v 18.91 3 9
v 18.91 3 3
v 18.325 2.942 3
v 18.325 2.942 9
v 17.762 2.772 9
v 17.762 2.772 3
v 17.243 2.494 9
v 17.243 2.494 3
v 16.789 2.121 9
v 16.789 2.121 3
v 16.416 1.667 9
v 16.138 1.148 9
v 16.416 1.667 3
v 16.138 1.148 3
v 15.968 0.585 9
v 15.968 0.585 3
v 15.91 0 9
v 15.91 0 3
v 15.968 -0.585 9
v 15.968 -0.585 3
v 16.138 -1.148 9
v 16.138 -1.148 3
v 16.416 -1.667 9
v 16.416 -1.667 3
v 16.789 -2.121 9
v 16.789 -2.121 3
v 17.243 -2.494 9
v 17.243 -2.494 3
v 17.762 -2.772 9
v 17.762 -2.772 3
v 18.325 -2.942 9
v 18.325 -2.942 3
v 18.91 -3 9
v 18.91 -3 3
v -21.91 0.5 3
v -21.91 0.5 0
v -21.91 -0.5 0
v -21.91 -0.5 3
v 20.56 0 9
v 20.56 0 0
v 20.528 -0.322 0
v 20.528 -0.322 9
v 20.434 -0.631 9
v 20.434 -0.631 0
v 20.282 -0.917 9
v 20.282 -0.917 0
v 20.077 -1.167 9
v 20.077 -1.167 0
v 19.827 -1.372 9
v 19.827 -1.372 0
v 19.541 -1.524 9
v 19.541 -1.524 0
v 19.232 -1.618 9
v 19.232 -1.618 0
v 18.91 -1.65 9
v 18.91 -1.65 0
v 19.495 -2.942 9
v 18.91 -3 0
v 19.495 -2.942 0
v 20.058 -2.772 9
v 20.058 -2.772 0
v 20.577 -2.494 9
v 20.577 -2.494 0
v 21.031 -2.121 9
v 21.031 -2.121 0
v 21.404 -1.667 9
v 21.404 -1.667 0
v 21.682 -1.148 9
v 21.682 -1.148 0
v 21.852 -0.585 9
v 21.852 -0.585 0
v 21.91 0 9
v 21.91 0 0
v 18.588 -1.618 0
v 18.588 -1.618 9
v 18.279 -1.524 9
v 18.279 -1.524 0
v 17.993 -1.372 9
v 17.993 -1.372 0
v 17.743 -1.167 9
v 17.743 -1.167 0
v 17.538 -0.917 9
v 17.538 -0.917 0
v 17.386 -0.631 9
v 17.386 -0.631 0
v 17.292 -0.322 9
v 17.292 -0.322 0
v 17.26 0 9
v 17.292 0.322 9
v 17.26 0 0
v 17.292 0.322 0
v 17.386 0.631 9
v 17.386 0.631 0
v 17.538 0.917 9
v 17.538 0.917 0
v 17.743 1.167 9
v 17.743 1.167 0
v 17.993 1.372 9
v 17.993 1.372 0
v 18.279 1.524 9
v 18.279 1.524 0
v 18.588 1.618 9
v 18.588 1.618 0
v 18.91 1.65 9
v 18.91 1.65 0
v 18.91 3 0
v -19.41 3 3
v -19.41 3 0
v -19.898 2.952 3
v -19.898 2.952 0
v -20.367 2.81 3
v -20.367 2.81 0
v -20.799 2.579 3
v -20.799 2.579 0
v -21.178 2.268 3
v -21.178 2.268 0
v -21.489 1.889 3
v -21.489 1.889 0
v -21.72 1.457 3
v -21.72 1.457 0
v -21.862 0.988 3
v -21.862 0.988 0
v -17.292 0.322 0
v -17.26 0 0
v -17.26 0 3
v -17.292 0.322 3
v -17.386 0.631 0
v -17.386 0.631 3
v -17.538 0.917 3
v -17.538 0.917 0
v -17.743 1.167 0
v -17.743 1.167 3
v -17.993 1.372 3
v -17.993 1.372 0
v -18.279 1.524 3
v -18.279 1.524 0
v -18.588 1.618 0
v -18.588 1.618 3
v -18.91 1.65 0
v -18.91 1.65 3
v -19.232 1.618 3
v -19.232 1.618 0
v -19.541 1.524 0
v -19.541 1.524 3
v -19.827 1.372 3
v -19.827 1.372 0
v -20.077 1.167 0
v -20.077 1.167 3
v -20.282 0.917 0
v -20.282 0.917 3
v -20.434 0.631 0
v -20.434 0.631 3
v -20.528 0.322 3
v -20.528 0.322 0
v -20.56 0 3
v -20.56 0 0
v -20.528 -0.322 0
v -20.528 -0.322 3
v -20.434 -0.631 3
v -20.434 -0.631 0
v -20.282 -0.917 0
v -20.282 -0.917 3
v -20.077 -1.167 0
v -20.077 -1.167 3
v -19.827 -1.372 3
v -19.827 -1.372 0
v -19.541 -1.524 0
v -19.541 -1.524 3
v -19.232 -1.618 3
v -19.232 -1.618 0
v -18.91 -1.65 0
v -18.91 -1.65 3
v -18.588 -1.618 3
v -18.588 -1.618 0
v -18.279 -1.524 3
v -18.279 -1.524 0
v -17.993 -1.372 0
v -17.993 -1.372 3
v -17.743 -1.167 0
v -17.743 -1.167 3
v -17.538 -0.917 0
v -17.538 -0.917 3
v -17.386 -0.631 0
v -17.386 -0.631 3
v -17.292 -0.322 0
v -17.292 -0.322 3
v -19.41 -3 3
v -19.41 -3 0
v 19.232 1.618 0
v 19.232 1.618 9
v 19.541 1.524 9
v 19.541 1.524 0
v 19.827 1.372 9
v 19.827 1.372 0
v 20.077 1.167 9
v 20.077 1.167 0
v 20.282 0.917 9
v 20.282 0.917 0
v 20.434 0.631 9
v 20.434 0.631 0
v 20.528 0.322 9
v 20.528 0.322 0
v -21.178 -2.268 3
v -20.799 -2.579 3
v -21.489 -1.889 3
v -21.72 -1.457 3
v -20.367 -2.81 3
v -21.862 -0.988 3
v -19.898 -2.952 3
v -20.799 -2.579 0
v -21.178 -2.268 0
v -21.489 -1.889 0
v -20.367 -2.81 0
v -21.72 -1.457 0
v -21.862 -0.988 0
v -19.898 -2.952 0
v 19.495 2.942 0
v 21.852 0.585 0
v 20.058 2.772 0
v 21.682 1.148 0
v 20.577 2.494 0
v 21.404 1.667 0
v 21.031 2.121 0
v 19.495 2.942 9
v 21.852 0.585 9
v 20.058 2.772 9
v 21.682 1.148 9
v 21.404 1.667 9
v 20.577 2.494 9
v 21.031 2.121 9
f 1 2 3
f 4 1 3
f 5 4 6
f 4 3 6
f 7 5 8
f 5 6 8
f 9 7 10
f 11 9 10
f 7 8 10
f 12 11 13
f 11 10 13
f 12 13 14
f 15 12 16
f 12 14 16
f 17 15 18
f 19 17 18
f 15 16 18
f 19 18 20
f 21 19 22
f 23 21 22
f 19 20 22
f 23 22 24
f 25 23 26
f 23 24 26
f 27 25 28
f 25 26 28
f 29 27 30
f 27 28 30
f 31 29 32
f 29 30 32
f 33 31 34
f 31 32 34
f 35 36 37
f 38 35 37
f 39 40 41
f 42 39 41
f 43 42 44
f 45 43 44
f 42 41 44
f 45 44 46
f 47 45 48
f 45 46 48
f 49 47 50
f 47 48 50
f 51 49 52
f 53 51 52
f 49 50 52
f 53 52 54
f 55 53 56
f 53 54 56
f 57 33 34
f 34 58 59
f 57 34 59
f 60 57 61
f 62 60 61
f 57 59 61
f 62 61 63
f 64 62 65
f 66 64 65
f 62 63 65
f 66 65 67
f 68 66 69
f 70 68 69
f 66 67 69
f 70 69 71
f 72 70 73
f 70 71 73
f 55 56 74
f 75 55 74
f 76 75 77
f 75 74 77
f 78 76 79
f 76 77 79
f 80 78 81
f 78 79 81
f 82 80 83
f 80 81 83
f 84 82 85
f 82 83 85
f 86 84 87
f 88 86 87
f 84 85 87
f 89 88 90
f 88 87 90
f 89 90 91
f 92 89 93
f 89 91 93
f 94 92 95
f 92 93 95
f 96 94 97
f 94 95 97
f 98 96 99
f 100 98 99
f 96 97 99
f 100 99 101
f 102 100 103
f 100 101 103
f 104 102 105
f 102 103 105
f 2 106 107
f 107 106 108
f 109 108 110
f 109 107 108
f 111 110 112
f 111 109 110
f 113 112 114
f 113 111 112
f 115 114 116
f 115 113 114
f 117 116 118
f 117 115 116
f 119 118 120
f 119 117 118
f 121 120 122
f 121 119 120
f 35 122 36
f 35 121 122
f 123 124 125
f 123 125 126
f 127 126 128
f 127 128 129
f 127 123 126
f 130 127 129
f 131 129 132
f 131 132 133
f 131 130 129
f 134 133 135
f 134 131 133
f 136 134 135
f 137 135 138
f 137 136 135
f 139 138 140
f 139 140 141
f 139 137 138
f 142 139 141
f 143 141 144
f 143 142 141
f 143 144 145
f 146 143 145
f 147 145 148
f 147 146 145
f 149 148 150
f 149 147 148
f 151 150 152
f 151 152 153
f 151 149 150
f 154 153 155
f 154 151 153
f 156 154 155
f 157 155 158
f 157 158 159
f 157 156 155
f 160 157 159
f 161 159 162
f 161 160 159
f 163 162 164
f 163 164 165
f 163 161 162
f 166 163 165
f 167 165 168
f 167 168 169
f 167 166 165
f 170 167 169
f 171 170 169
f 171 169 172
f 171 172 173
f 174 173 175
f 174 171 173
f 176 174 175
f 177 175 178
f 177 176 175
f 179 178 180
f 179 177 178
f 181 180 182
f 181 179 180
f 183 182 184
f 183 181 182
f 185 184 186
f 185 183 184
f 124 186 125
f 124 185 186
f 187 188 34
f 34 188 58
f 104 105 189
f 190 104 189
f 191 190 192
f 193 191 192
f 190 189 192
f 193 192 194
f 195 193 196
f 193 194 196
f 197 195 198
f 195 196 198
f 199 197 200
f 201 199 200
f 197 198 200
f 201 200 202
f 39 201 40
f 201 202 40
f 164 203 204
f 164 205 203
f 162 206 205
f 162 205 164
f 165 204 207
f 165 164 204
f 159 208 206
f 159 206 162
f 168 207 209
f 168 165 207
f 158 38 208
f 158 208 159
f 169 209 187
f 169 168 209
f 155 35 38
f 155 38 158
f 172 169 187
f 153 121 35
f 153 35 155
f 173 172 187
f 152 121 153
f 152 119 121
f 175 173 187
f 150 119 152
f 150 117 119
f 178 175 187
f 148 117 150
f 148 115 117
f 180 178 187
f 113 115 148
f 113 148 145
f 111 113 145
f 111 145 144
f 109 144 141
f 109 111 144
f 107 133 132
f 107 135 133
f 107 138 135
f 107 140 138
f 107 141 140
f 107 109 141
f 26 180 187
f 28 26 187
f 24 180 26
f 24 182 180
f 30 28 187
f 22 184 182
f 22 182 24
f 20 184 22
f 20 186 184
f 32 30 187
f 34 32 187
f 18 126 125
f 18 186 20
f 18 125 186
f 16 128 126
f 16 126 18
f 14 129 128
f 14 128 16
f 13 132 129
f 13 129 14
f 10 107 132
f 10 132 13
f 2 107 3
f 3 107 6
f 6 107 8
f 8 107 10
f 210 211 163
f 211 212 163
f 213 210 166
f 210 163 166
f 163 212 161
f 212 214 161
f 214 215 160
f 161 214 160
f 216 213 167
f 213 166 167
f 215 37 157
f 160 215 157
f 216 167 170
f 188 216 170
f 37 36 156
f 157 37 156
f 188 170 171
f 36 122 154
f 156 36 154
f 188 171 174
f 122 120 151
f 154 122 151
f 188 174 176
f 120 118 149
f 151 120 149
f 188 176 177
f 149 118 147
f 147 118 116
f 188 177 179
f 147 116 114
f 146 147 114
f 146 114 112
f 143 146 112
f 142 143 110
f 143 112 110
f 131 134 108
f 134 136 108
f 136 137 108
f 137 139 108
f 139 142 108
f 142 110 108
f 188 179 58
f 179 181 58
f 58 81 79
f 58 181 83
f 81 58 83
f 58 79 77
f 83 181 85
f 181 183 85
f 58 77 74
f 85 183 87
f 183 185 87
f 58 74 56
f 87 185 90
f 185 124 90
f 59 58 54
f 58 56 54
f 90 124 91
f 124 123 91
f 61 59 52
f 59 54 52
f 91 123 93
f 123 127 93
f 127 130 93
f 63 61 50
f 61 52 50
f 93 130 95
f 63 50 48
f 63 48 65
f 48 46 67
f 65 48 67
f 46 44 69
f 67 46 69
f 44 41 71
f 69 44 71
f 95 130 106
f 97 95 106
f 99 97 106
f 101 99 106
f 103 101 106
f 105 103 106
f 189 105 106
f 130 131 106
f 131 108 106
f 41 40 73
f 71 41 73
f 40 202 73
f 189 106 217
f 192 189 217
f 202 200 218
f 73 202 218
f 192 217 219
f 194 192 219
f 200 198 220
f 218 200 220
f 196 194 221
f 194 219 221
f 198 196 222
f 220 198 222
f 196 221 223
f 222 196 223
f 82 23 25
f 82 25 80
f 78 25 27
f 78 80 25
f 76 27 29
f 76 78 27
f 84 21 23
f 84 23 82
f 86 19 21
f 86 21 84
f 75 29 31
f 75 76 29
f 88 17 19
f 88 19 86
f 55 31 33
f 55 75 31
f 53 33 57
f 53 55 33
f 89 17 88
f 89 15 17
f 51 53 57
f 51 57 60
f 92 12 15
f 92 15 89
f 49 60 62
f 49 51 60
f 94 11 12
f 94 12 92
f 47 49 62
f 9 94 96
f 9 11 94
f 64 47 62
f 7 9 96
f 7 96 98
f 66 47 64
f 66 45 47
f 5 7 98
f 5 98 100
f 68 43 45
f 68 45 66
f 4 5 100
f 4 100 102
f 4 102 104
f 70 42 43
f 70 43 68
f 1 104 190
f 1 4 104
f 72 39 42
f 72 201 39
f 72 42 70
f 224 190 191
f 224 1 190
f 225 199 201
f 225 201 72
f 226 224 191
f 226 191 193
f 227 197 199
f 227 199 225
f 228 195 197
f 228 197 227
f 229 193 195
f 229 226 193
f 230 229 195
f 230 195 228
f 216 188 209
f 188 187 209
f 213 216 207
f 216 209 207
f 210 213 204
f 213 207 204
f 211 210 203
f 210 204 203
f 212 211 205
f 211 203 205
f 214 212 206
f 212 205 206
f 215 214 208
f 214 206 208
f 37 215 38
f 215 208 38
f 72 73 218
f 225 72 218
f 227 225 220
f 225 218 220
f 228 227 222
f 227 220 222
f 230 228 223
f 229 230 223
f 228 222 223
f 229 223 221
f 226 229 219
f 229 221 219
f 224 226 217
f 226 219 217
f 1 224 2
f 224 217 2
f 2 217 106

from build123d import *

# Parameters (mm, degrees)
SKETCH1_R           = 1.65
BOSS_EXTRUDE1_DEPTH = 3
SKETCH1_3_R         = 3
SKETCH1_3_R_2       = 1.65
BOSS_EXTRUDE2_DEPTH = 9
FILLET1_R           = 2.5


with BuildPart() as part:
    # Sketch1 → Boss-Extrude1 (new body)
    with BuildSketch(Plane.XY):
        with BuildLine():
            Line((-21.91, -3), (18.91, -3))
            ThreePointArc((18.91, -3), (15.91, 0), (18.91, 3))
            Line((18.91, 3), (-21.91, 3))
            Line((-21.91, 3), (-21.91, -3))
        make_face()
        with Locations((-18.91, 0)):
            Circle(SKETCH1_R, mode=Mode.SUBTRACT)
    extrude(amount=BOSS_EXTRUDE1_DEPTH)

    # Sketch1<3> → Boss-Extrude2 (add)
    with BuildSketch(Plane.XY):
        with Locations((18.91, 0)):
            Circle(SKETCH1_3_R)
        with Locations((18.91, 0)):
            Circle(SKETCH1_3_R_2, mode=Mode.SUBTRACT)
    extrude(amount=BOSS_EXTRUDE2_DEPTH)

    # Fillet1
    fillet1_edges = [part.edges().sort_by_distance(p)[0] for p in [
        (-21.91, -3, 1.5),
        (-21.91, 3, 1.5),
    ]]
    fillet(fillet1_edges, radius=FILLET1_R)


solid = part.part
